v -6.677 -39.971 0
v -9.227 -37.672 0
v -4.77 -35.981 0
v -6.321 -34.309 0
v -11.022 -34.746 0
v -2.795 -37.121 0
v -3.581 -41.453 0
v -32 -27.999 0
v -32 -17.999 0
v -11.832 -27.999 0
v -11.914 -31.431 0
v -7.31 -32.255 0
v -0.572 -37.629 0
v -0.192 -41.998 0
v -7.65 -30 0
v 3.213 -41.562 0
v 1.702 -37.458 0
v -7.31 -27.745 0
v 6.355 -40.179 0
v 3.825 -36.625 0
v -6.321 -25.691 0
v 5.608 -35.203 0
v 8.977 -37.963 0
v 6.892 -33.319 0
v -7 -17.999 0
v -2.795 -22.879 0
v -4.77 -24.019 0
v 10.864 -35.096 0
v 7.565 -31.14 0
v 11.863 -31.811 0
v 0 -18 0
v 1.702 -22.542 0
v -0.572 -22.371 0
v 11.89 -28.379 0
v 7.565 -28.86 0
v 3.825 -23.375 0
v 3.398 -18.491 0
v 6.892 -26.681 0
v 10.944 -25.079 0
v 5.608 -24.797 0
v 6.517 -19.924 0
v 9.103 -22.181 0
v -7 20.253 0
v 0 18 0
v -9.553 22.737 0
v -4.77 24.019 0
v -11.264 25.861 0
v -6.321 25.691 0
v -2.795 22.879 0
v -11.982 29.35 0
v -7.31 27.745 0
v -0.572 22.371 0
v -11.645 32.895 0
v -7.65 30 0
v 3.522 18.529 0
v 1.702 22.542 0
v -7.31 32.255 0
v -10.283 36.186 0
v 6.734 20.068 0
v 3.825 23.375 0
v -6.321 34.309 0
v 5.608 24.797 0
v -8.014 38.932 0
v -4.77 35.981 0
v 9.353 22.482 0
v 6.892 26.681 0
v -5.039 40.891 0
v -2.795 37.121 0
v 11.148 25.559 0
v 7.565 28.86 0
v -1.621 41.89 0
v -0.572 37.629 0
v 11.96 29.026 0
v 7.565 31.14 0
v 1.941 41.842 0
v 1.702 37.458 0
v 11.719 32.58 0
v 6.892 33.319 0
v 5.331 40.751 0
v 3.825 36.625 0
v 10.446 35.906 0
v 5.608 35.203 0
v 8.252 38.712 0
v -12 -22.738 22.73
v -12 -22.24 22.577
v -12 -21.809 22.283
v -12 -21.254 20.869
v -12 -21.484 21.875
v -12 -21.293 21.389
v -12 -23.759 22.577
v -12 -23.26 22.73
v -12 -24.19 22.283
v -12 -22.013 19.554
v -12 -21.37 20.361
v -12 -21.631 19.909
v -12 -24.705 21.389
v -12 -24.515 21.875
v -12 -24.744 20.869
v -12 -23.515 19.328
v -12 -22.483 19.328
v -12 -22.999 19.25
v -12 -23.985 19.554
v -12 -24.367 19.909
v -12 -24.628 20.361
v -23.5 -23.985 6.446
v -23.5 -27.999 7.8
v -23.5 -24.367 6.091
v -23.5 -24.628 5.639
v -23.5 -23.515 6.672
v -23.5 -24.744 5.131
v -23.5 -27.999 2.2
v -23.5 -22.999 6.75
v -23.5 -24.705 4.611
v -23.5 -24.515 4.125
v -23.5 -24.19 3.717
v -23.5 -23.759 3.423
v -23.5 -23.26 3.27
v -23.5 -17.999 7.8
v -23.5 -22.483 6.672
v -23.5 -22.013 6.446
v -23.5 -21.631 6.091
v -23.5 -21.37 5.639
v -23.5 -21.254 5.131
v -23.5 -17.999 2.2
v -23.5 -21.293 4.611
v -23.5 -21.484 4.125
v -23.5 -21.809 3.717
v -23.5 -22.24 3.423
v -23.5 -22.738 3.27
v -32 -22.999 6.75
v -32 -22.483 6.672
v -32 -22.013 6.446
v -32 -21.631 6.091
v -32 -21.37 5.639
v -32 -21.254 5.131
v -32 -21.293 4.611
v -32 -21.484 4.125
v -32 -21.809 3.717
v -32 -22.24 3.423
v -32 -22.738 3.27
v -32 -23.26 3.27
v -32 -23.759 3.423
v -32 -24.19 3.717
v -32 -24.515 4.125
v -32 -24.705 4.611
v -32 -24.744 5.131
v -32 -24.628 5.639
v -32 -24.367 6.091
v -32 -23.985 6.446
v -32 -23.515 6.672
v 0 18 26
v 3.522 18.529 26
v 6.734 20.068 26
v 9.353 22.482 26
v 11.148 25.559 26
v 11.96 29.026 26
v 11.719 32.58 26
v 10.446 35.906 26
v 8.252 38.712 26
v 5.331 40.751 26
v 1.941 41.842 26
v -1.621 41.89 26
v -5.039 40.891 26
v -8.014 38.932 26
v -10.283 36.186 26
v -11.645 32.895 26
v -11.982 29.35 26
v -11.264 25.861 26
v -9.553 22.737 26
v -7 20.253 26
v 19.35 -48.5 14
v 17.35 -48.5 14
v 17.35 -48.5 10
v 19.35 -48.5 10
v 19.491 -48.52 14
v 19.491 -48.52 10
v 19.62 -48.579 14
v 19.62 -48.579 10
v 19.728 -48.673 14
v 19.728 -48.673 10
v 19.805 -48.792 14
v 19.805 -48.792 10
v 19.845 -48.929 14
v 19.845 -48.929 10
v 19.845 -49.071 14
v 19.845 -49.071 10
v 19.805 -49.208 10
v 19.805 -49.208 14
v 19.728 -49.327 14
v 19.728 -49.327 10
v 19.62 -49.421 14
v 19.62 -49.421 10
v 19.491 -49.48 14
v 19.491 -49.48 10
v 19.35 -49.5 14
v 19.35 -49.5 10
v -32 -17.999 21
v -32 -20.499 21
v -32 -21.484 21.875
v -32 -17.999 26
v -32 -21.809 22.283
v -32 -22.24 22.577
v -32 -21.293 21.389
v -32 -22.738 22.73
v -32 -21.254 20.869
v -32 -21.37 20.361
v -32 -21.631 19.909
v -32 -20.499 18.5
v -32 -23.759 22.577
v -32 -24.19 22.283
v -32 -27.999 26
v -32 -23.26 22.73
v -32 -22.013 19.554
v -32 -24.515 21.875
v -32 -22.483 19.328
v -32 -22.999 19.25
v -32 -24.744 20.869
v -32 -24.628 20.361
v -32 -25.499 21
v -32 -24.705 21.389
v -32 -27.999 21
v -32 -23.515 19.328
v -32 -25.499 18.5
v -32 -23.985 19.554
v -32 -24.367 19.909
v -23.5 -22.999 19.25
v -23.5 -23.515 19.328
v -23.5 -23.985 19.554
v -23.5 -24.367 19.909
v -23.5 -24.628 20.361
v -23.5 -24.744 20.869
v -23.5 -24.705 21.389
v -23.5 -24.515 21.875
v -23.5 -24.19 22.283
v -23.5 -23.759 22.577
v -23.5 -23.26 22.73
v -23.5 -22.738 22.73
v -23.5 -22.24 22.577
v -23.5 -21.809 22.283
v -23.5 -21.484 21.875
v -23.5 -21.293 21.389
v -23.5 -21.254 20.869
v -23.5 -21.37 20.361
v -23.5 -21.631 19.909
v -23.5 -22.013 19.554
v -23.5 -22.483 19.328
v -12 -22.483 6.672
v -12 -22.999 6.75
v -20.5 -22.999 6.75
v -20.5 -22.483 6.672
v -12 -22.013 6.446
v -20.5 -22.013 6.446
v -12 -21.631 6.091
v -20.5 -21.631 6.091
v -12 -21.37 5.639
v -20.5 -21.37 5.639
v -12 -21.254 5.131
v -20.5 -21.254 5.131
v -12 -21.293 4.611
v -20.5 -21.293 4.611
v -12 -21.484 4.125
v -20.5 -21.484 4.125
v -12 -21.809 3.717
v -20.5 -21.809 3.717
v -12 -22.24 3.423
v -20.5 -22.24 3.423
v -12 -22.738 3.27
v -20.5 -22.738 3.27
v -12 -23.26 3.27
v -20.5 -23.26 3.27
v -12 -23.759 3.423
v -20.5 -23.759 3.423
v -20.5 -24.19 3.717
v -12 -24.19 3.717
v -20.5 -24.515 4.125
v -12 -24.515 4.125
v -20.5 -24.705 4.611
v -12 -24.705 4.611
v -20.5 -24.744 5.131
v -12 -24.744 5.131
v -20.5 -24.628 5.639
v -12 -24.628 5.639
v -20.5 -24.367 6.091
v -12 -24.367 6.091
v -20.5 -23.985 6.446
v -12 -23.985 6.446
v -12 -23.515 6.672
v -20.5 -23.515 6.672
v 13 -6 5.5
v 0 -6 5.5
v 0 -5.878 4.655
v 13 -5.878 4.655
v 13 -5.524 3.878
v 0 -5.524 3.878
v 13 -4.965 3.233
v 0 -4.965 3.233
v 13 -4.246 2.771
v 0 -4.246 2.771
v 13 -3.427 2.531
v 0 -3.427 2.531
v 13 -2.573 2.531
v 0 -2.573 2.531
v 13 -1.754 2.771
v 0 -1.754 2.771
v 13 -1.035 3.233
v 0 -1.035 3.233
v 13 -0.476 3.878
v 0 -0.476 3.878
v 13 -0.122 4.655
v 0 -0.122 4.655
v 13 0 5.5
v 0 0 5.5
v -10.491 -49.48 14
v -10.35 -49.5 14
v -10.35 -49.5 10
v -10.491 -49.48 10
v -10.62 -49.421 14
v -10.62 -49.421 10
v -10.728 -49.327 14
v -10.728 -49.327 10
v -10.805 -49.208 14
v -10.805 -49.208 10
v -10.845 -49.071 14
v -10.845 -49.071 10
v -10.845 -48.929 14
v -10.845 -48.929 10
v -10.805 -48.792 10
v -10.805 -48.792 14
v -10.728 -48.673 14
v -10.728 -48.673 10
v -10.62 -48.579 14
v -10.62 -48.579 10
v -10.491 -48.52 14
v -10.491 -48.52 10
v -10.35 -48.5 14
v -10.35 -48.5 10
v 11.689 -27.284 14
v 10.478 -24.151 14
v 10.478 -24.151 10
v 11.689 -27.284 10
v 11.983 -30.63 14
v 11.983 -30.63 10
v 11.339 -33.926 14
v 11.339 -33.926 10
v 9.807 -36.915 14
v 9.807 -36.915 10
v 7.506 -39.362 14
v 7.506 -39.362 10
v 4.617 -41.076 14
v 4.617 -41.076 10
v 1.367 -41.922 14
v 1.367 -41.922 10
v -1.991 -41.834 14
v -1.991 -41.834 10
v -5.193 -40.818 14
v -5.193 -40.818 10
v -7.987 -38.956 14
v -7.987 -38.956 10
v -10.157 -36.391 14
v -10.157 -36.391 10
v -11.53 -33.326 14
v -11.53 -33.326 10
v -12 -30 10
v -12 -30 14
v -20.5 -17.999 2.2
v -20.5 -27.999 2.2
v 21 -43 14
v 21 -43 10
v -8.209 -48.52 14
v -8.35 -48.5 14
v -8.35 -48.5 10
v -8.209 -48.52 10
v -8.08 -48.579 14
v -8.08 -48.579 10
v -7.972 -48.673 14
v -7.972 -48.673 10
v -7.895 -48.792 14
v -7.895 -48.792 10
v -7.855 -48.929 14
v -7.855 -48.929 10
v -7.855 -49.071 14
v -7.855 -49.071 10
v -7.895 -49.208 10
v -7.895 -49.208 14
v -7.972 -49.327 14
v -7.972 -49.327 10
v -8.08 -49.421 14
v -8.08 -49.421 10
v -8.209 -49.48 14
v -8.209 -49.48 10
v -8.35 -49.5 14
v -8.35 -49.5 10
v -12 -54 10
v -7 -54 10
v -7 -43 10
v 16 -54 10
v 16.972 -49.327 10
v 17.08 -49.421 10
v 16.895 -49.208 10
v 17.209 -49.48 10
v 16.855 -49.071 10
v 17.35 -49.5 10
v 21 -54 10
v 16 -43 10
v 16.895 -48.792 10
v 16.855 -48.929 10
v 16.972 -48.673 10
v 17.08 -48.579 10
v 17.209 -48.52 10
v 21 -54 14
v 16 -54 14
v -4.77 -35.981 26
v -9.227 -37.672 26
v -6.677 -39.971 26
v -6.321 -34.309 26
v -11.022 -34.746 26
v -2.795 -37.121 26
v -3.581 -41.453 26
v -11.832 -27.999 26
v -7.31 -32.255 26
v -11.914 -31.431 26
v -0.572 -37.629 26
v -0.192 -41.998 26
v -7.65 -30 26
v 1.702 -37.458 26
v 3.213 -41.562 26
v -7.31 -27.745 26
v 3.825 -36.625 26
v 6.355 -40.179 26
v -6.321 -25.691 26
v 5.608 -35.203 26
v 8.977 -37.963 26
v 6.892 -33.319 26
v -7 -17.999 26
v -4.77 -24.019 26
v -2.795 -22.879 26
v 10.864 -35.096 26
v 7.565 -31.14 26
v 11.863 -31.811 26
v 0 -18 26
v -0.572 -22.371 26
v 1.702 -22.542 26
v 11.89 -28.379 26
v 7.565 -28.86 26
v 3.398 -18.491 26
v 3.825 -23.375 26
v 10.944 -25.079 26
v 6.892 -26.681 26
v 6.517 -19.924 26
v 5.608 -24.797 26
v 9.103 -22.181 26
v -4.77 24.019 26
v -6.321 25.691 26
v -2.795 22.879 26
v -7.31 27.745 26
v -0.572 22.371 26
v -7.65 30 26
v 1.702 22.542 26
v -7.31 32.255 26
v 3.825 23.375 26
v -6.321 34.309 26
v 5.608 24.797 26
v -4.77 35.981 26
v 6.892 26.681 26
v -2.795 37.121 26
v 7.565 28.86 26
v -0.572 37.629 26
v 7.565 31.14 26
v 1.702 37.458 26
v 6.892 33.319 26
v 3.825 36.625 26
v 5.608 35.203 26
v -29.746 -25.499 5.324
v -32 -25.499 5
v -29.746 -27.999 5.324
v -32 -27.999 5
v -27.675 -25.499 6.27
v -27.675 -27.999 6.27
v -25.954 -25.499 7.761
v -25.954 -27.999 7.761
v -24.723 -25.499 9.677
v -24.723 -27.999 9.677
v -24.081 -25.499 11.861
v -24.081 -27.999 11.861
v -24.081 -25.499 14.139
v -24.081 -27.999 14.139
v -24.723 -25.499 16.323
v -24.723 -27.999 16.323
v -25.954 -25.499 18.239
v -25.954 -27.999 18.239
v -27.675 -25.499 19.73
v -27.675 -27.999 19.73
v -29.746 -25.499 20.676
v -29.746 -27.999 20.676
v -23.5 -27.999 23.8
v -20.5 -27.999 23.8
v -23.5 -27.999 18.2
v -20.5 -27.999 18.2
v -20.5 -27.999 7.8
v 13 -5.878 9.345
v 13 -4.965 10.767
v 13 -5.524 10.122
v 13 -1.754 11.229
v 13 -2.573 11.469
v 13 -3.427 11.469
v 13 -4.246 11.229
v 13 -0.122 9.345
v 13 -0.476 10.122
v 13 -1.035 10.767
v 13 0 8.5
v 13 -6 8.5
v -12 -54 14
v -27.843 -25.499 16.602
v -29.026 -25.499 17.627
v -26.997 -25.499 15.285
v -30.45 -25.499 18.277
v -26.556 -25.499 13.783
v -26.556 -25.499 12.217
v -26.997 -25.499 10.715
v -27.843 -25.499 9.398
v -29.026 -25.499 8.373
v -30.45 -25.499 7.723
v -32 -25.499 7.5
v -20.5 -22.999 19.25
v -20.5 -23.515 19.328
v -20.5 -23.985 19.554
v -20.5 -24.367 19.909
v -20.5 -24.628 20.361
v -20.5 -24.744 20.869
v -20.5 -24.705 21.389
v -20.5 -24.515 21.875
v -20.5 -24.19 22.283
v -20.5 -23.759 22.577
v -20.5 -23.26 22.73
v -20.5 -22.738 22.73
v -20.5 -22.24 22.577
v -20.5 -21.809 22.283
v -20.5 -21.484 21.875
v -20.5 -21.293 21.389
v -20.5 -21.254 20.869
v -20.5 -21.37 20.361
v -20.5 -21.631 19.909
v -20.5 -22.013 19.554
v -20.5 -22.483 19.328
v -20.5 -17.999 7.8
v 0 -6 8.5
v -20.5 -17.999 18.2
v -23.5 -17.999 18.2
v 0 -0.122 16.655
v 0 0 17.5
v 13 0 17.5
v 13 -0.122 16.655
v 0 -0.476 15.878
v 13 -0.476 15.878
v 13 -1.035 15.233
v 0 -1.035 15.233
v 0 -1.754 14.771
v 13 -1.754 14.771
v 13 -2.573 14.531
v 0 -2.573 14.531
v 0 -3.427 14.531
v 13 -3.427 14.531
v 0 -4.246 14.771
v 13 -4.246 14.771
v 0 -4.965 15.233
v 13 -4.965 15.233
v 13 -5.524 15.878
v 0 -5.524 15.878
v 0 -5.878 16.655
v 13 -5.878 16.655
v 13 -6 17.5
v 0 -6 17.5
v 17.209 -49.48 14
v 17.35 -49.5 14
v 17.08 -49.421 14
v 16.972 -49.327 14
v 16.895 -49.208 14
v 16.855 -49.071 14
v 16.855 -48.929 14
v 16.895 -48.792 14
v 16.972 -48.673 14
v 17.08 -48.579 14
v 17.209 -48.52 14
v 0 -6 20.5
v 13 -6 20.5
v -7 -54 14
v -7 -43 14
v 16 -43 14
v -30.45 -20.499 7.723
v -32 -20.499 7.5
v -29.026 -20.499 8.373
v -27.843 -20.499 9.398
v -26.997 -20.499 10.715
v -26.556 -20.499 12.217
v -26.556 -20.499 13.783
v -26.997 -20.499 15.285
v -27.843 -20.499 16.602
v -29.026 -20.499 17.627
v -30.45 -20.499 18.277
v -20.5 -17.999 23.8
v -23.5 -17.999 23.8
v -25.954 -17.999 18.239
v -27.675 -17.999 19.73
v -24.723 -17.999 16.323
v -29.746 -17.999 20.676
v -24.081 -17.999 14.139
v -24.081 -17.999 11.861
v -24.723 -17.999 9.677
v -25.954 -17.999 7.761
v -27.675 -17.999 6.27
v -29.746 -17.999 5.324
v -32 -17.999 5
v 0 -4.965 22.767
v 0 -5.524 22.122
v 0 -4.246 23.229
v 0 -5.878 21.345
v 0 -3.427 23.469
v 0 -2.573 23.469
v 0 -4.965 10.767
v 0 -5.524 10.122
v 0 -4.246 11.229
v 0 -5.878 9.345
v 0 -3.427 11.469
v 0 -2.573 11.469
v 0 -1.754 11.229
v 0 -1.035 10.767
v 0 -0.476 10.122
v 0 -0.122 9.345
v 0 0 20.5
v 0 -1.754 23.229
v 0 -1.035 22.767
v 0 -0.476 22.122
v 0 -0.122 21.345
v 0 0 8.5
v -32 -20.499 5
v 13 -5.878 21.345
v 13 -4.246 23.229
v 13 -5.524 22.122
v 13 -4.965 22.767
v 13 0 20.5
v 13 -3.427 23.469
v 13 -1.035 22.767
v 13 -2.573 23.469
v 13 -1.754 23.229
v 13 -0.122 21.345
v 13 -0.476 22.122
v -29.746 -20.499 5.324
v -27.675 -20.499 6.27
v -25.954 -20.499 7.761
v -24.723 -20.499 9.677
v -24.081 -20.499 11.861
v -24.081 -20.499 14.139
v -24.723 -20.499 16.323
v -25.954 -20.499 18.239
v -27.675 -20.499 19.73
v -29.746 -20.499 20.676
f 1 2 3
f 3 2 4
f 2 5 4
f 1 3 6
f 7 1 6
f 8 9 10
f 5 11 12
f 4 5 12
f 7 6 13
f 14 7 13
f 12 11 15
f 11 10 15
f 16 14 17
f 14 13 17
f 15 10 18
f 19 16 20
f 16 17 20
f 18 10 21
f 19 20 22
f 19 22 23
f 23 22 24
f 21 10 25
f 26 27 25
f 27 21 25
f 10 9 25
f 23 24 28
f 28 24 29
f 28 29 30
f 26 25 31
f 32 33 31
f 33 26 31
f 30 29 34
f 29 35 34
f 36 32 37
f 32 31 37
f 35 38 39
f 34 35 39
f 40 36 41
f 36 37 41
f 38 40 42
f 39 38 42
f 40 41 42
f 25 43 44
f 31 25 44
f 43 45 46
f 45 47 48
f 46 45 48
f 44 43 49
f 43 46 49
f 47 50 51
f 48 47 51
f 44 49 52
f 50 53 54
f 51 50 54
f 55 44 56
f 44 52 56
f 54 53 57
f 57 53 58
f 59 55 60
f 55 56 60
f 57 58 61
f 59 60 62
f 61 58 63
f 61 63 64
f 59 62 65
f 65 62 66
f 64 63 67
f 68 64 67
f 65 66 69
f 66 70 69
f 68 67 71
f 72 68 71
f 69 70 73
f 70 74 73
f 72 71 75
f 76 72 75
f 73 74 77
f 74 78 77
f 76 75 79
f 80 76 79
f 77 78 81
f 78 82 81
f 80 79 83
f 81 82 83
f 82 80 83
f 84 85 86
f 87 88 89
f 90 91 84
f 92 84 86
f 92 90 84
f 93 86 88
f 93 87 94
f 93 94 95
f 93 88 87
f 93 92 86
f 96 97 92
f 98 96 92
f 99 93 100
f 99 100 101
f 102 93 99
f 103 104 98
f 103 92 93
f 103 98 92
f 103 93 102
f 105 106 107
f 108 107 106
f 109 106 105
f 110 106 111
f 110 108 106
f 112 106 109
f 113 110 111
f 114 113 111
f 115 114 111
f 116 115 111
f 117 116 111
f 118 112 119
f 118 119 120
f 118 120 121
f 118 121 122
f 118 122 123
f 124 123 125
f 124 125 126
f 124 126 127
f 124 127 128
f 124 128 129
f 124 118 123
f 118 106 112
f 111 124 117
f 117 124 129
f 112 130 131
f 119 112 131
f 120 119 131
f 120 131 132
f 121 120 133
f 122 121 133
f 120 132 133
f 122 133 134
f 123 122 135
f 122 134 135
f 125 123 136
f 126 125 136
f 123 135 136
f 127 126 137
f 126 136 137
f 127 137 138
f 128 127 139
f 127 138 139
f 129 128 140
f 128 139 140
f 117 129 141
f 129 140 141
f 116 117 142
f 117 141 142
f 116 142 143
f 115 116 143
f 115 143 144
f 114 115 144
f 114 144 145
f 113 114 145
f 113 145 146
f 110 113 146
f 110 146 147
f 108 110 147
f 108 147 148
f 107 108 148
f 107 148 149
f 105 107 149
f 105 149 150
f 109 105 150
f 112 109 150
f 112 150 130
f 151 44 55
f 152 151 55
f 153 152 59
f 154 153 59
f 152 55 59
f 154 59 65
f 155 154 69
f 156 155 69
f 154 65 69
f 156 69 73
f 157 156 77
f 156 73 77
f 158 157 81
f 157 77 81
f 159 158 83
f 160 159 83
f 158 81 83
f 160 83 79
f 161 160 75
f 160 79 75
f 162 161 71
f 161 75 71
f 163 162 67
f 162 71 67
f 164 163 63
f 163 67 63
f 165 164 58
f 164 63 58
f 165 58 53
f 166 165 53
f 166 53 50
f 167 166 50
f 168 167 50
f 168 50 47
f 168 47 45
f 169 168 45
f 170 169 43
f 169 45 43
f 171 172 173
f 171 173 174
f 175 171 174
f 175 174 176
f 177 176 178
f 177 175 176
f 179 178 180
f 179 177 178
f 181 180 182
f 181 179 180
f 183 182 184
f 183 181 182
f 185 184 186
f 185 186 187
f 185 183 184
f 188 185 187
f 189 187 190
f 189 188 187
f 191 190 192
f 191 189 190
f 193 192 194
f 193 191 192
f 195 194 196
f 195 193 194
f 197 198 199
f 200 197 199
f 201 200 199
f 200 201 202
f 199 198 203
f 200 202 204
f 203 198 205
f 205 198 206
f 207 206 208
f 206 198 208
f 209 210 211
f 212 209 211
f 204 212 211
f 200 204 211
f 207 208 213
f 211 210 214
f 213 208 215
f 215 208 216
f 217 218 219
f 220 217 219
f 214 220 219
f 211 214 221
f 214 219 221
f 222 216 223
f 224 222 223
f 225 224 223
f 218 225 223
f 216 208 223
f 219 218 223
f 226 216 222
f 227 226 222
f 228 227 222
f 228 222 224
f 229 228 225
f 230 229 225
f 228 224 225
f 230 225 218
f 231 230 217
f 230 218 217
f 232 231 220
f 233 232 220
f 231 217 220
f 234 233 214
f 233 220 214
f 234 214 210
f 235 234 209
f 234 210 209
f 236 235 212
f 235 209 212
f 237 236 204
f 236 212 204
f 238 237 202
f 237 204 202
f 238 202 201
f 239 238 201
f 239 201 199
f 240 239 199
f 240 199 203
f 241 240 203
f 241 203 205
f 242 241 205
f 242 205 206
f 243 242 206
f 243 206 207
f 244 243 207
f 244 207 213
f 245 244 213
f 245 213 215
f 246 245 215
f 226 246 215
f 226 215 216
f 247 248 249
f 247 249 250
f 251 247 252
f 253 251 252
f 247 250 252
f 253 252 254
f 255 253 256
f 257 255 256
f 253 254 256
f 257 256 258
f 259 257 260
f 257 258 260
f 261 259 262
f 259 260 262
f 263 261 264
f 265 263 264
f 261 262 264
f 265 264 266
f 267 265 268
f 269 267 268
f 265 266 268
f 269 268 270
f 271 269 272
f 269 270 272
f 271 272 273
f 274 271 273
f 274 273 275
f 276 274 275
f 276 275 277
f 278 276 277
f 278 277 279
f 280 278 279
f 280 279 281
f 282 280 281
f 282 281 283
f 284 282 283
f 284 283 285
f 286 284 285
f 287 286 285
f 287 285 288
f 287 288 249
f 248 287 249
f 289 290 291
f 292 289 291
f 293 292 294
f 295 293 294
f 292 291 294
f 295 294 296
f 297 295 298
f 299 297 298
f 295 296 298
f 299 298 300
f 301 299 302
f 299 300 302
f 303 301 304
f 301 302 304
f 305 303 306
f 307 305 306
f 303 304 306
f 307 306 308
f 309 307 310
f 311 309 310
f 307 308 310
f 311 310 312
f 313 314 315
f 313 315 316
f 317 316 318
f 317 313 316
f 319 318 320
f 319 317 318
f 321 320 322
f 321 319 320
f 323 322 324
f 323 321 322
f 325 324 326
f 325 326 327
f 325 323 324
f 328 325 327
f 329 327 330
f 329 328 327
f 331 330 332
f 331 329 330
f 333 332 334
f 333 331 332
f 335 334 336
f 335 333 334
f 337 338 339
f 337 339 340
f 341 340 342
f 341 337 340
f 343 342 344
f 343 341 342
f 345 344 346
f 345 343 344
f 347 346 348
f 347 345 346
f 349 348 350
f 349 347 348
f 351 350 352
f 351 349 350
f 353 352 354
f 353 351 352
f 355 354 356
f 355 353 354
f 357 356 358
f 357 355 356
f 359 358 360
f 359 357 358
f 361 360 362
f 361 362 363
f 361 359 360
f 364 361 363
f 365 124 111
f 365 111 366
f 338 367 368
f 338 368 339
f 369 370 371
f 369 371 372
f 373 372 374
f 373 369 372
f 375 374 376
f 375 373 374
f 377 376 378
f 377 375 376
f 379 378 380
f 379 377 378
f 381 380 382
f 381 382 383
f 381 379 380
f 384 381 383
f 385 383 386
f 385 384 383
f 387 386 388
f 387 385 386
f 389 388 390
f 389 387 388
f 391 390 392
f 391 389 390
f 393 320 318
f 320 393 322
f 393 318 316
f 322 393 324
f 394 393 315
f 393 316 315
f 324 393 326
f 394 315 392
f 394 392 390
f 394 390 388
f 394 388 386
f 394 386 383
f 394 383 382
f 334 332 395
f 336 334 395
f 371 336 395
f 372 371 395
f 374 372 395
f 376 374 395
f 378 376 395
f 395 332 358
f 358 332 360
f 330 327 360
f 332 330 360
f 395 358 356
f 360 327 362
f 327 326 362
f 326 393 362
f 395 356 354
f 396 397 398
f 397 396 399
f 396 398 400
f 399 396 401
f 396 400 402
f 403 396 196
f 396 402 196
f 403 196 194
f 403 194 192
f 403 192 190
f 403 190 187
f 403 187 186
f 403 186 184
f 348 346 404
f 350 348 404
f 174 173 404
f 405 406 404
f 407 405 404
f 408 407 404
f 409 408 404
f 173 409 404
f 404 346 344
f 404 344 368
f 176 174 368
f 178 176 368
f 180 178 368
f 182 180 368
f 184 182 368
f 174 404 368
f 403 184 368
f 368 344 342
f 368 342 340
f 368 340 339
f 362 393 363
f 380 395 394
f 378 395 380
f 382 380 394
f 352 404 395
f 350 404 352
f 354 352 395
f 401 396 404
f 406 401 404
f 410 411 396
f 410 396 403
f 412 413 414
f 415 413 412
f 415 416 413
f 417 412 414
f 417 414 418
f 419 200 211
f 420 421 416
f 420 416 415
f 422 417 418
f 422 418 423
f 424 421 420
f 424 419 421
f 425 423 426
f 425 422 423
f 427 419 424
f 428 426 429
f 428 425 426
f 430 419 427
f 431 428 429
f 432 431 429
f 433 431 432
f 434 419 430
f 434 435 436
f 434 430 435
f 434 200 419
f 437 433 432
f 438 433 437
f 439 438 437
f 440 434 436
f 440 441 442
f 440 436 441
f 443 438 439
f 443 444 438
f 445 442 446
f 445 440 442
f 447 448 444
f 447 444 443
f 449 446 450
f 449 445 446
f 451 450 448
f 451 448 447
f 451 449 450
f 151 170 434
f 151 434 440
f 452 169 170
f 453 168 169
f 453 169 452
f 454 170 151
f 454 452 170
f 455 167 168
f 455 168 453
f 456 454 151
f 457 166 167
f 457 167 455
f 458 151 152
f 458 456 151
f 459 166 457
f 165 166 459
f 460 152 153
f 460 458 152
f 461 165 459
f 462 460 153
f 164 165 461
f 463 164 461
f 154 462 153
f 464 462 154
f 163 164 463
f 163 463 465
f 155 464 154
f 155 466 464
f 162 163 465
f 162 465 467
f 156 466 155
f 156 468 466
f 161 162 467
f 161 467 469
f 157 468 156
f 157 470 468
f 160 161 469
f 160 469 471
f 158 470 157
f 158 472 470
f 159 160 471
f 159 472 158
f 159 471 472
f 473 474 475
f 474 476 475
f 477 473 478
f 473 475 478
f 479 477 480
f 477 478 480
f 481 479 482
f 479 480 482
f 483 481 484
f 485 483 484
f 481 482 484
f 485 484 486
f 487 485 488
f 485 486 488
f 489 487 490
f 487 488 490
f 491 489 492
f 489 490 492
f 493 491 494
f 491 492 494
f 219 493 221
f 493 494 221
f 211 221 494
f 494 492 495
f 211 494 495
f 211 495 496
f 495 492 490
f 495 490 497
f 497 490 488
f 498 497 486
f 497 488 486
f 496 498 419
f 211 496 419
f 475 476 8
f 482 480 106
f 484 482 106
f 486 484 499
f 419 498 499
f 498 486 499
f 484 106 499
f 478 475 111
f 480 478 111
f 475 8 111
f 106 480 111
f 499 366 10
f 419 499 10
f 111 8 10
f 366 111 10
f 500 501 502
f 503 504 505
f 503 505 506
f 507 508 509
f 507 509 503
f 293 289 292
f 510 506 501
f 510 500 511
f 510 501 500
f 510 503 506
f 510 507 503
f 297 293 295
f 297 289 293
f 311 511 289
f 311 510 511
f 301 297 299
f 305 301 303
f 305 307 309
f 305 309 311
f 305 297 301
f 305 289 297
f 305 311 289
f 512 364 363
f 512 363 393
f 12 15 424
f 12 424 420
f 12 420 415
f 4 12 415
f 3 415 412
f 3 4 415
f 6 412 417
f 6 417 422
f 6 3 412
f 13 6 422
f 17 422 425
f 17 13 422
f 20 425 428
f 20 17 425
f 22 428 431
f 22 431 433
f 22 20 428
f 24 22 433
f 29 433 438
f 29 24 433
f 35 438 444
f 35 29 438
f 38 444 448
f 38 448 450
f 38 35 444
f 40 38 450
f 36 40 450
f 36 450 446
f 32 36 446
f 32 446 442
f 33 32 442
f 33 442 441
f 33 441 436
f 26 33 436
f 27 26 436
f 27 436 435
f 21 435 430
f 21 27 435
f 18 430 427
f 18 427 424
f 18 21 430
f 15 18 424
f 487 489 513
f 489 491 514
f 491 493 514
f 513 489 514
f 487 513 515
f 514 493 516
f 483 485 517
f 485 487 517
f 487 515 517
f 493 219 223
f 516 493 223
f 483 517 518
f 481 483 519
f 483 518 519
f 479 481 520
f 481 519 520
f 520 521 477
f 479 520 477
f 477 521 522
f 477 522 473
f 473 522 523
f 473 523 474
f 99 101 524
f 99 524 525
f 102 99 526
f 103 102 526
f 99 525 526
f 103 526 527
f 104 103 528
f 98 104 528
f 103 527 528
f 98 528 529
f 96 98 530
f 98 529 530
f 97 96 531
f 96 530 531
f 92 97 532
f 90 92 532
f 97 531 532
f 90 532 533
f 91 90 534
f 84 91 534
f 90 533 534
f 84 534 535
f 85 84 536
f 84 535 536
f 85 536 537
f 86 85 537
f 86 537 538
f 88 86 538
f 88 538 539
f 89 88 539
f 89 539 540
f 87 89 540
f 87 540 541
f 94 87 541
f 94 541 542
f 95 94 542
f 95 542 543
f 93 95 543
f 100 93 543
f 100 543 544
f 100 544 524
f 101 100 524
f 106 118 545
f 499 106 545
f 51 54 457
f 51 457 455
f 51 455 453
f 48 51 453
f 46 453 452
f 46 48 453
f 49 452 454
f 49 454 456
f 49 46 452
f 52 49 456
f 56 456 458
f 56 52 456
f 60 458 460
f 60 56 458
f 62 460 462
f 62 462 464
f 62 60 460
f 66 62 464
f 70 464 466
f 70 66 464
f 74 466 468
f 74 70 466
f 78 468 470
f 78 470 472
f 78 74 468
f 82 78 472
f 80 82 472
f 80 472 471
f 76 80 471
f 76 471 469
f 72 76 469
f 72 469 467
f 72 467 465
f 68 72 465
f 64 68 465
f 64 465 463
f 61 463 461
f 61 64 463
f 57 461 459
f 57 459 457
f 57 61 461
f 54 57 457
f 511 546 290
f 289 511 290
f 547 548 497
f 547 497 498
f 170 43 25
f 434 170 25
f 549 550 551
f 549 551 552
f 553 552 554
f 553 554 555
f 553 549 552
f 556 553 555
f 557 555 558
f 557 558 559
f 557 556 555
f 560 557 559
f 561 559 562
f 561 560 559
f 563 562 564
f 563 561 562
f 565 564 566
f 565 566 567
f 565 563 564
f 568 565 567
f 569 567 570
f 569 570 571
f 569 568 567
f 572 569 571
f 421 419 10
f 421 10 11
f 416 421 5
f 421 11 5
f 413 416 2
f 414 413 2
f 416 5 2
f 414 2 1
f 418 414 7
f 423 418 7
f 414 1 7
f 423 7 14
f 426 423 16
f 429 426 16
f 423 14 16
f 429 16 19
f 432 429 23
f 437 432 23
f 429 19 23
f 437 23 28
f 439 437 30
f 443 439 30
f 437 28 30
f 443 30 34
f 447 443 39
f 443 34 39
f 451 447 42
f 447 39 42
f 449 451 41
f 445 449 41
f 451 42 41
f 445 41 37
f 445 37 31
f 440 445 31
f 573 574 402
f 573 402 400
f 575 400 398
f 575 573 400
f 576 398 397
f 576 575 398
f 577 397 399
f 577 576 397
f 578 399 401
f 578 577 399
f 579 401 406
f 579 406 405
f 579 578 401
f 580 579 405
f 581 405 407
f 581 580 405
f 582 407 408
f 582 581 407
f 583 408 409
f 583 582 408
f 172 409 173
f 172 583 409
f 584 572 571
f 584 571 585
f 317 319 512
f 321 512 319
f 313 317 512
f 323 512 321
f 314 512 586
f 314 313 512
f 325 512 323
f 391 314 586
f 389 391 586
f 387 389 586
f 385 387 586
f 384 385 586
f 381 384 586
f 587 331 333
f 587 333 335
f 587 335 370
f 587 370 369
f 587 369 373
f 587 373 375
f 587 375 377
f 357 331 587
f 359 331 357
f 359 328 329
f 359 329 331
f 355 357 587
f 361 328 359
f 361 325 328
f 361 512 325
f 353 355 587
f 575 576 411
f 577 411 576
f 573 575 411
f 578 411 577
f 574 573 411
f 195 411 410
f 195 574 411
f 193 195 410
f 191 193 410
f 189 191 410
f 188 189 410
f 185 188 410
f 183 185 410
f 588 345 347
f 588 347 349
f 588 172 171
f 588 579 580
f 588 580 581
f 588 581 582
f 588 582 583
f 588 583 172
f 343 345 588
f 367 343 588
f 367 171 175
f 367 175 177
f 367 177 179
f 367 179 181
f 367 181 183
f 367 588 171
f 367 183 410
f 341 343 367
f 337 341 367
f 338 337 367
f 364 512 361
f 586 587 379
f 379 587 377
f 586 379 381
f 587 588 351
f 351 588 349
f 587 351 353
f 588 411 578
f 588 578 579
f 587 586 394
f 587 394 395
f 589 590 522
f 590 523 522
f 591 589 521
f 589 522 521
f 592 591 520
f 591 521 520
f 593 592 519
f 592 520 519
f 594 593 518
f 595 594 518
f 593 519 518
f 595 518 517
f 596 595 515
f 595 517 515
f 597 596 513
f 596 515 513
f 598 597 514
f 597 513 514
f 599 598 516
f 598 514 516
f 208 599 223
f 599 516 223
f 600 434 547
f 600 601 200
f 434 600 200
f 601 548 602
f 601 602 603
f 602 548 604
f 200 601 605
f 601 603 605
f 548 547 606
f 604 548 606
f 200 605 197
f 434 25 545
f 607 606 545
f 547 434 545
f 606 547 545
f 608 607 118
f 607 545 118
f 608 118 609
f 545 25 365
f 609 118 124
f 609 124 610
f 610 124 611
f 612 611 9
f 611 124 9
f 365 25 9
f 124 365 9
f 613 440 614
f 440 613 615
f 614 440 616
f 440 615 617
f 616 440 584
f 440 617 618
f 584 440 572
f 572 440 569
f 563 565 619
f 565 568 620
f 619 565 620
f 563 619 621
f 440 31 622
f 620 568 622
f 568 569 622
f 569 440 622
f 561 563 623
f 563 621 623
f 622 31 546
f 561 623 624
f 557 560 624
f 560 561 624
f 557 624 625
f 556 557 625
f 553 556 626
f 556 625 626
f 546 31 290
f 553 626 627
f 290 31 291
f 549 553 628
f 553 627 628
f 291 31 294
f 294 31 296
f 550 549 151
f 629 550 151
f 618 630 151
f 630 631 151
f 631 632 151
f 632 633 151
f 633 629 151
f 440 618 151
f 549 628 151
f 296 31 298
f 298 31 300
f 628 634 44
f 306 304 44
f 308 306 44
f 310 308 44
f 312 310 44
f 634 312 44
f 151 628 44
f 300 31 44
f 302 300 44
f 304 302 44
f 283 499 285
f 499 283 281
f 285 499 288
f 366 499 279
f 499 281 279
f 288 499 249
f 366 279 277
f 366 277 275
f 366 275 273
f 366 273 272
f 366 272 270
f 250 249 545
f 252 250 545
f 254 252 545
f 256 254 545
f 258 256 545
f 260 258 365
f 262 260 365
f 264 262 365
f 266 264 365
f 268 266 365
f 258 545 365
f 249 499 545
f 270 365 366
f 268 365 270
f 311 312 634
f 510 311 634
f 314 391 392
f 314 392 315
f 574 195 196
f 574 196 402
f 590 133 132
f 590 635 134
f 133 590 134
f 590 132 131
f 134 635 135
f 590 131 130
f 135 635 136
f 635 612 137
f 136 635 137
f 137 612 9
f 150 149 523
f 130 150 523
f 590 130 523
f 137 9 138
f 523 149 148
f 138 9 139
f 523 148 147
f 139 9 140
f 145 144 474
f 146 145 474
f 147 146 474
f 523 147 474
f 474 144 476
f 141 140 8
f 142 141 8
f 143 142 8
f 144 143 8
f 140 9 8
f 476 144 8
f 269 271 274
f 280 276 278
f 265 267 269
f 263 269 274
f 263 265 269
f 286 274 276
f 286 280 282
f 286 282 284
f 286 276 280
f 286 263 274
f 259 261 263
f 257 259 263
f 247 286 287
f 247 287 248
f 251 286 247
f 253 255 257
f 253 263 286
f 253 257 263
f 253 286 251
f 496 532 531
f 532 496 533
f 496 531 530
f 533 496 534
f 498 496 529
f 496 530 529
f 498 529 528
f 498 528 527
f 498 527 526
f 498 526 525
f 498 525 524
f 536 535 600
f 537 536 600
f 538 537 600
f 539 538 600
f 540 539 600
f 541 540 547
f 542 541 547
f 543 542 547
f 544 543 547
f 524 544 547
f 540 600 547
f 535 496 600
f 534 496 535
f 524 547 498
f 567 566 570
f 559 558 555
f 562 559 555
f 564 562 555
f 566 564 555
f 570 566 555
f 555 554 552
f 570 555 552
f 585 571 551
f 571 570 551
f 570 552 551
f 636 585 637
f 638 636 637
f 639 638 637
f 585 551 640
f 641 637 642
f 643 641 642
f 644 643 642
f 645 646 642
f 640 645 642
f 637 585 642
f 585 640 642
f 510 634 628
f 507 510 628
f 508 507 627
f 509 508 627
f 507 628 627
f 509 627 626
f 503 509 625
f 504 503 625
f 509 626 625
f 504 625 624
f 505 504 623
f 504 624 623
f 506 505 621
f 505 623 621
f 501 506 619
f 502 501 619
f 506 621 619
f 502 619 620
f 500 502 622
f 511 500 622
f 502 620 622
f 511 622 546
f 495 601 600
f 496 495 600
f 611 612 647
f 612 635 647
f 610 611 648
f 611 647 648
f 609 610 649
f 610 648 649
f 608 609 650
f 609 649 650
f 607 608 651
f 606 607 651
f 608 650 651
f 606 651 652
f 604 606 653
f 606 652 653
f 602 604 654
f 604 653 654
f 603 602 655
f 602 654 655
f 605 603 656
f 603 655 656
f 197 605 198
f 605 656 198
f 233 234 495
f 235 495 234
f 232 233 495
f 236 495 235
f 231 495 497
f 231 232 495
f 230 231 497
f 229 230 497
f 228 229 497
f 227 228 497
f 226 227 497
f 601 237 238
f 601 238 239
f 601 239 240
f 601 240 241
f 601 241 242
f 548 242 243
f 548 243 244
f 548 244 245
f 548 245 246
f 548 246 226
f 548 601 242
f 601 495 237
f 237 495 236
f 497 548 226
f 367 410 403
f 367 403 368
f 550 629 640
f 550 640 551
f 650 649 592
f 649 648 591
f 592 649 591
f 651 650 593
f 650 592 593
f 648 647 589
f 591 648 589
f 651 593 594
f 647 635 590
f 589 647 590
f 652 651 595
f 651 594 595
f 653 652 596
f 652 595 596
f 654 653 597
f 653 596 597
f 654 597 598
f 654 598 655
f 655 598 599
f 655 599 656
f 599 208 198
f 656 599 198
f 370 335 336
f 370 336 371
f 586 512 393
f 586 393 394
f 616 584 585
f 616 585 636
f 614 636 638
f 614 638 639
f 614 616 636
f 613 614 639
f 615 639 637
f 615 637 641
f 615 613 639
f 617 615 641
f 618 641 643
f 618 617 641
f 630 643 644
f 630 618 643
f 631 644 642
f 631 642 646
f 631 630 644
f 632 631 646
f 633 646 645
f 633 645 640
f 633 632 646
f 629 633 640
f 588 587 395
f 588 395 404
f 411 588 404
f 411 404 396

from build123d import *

# Parameters (mm, degrees)
ESBO_O1_R                = 7.65
RESSALTO_EXTRUS_O1_DEPTH = 26
ESBO_O4_R                = 1.75
CORTE_EXTRUS_O1_DEPTH    = 20
ESBO_O5_W                = 3
ESBO_O5_H                = 5.6
CORTE_EXTRUS_O2_DEPTH    = 25
RESSALTO_EXTRUS_O2_DEPTH = 13
RESSALTO_EXTRUS_O3_START = -12
RESSALTO_EXTRUS_O3_DEPTH = 4


with BuildPart() as part:
    # Esboço1 → Ressalto-extrusão1 (new body)
    with BuildSketch(Plane.XY):
        with BuildLine():
            Line((-7, 20.253205655), (-7, -17.999237653))
            Line((-7, -17.999237653), (-32, -17.999237653))
            Line((-32, -17.999237653), (-32, -27.999237653))
            Line((-32, -27.999237653), (-11.832030681, -27.999237653))
            ThreePointArc((-11.832030681, -27.999237653), (7.745671431, -39.165400923), (0, -18))
            Line((0, -18), (0, 18))
            ThreePointArc((0, 18), (3.676851089, 41.422817781), (-7, 20.253205655))
        make_face()
        with Locations(Location((0, 30, 0), (0, 0, 180))):
            Circle(ESBO_O1_R, mode=Mode.SUBTRACT)
        with Locations(Location((0, -30, 0), (0, 0, 180))):
            Circle(ESBO_O1_R, mode=Mode.SUBTRACT)
    extrude(amount=RESSALTO_EXTRUS_O1_DEPTH)

    # Esboço3 → Corte-Revolução1 (revolve, cut)
    with BuildSketch(Plane.ZY.offset(32)):
        Polygon((13, -17.999237653), (21, -17.999237653), (21, -20.499237653), (18.5, -20.499237653), (18.5, -25.499237653), (21, -25.499237653), (21, -27.999237653), (13, -27.999237653), align=None)
    revolve(axis=Axis((-32, -17.999237653, 13), (0, -1, 0)), mode=Mode.SUBTRACT)

    # Esboço4 → Corte-extrusão1 (cut)
    with BuildSketch(Plane.ZY.offset(32)):
        with Locations((5, -22.999237653)):
            Circle(ESBO_O4_R)
        with Locations(Location((21, -22.999237653, 0), (0, 0, 180))):
            Circle(ESBO_O4_R)
    extrude(amount=-CORTE_EXTRUS_O1_DEPTH, mode=Mode.SUBTRACT)

    # Esboço5 → Corte-extrusão2 (cut)
    with BuildSketch(Plane(origin=(0, -17.999237653, 0), x_dir=(1, 0, 0), z_dir=(0, 1, 0))):
        with Locations((-22, -5)):
            Rectangle(ESBO_O5_W, ESBO_O5_H)
        with Locations((-22, -21)):
            Rectangle(ESBO_O5_W, ESBO_O5_H)
    extrude(amount=-CORTE_EXTRUS_O2_DEPTH, mode=Mode.SUBTRACT)

    # Esboço6 → Ressalto-extrusão2 (add)
    with BuildSketch(Plane(origin=(0, 0, 0), x_dir=(0, 0, -1), z_dir=(1, 0, 0))):
        with BuildLine():
            Line((-17.5, -6), (-20.5, -6))
            ThreePointArc((-20.5, -6), (-23.5, -3), (-20.5, 0))
            Line((-20.5, 0), (-17.5, 0))
            ThreePointArc((-17.5, 0), (-14.5, -3), (-17.5, -6))
        make_face()
        with BuildLine():
            Line((-8.5, -6), (-5.5, -6))
            ThreePointArc((-5.5, -6), (-2.5, -3), (-5.5, 0))
            Line((-5.5, 0), (-8.5, 0))
            ThreePointArc((-8.5, 0), (-11.5, -3), (-8.5, -6))
        make_face()
    extrude(amount=RESSALTO_EXTRUS_O2_DEPTH)


with BuildPart() as body_2:
    # Esboço7 → Ressalto-extrusão3 (new body)
    with BuildSketch(Plane.XY.offset(26).offset(RESSALTO_EXTRUS_O3_START)):
        with BuildLine():
            ThreePointArc((10.477995362, -24.15093057), (3.021924524, -41.613267076), (-12, -30))
            Line((-12, -30), (-12, -54))
            Line((-12, -54), (-7, -54))
            Line((-7, -54), (-7, -43))
            Line((-7, -43), (16, -43))
            Line((16, -43), (16, -54))
            Line((16, -54), (21, -54))
            Line((21, -54), (21, -43))
            Line((21, -43), (10.477995362, -24.15093057))
        make_face()
        with BuildLine():
            ThreePointArc((-10.35, -49.5), (-10.85, -49), (-10.35, -48.5))
            Line((-10.35, -48.5), (-8.35, -48.5))
            ThreePointArc((-8.35, -48.5), (-7.85, -49), (-8.35, -49.5))
            Line((-8.35, -49.5), (-10.35, -49.5))
        make_face(mode=Mode.SUBTRACT)
        with BuildLine():
            ThreePointArc((19.35, -48.5), (19.85, -49), (19.35, -49.5))
            Line((19.35, -49.5), (17.35, -49.5))
            ThreePointArc((17.35, -49.5), (16.85, -49), (17.35, -48.5))
            Line((17.35, -48.5), (19.35, -48.5))
        make_face(mode=Mode.SUBTRACT)
    extrude(amount=-RESSALTO_EXTRUS_O3_DEPTH)


solid = Compound([part.part, body_2.part])
